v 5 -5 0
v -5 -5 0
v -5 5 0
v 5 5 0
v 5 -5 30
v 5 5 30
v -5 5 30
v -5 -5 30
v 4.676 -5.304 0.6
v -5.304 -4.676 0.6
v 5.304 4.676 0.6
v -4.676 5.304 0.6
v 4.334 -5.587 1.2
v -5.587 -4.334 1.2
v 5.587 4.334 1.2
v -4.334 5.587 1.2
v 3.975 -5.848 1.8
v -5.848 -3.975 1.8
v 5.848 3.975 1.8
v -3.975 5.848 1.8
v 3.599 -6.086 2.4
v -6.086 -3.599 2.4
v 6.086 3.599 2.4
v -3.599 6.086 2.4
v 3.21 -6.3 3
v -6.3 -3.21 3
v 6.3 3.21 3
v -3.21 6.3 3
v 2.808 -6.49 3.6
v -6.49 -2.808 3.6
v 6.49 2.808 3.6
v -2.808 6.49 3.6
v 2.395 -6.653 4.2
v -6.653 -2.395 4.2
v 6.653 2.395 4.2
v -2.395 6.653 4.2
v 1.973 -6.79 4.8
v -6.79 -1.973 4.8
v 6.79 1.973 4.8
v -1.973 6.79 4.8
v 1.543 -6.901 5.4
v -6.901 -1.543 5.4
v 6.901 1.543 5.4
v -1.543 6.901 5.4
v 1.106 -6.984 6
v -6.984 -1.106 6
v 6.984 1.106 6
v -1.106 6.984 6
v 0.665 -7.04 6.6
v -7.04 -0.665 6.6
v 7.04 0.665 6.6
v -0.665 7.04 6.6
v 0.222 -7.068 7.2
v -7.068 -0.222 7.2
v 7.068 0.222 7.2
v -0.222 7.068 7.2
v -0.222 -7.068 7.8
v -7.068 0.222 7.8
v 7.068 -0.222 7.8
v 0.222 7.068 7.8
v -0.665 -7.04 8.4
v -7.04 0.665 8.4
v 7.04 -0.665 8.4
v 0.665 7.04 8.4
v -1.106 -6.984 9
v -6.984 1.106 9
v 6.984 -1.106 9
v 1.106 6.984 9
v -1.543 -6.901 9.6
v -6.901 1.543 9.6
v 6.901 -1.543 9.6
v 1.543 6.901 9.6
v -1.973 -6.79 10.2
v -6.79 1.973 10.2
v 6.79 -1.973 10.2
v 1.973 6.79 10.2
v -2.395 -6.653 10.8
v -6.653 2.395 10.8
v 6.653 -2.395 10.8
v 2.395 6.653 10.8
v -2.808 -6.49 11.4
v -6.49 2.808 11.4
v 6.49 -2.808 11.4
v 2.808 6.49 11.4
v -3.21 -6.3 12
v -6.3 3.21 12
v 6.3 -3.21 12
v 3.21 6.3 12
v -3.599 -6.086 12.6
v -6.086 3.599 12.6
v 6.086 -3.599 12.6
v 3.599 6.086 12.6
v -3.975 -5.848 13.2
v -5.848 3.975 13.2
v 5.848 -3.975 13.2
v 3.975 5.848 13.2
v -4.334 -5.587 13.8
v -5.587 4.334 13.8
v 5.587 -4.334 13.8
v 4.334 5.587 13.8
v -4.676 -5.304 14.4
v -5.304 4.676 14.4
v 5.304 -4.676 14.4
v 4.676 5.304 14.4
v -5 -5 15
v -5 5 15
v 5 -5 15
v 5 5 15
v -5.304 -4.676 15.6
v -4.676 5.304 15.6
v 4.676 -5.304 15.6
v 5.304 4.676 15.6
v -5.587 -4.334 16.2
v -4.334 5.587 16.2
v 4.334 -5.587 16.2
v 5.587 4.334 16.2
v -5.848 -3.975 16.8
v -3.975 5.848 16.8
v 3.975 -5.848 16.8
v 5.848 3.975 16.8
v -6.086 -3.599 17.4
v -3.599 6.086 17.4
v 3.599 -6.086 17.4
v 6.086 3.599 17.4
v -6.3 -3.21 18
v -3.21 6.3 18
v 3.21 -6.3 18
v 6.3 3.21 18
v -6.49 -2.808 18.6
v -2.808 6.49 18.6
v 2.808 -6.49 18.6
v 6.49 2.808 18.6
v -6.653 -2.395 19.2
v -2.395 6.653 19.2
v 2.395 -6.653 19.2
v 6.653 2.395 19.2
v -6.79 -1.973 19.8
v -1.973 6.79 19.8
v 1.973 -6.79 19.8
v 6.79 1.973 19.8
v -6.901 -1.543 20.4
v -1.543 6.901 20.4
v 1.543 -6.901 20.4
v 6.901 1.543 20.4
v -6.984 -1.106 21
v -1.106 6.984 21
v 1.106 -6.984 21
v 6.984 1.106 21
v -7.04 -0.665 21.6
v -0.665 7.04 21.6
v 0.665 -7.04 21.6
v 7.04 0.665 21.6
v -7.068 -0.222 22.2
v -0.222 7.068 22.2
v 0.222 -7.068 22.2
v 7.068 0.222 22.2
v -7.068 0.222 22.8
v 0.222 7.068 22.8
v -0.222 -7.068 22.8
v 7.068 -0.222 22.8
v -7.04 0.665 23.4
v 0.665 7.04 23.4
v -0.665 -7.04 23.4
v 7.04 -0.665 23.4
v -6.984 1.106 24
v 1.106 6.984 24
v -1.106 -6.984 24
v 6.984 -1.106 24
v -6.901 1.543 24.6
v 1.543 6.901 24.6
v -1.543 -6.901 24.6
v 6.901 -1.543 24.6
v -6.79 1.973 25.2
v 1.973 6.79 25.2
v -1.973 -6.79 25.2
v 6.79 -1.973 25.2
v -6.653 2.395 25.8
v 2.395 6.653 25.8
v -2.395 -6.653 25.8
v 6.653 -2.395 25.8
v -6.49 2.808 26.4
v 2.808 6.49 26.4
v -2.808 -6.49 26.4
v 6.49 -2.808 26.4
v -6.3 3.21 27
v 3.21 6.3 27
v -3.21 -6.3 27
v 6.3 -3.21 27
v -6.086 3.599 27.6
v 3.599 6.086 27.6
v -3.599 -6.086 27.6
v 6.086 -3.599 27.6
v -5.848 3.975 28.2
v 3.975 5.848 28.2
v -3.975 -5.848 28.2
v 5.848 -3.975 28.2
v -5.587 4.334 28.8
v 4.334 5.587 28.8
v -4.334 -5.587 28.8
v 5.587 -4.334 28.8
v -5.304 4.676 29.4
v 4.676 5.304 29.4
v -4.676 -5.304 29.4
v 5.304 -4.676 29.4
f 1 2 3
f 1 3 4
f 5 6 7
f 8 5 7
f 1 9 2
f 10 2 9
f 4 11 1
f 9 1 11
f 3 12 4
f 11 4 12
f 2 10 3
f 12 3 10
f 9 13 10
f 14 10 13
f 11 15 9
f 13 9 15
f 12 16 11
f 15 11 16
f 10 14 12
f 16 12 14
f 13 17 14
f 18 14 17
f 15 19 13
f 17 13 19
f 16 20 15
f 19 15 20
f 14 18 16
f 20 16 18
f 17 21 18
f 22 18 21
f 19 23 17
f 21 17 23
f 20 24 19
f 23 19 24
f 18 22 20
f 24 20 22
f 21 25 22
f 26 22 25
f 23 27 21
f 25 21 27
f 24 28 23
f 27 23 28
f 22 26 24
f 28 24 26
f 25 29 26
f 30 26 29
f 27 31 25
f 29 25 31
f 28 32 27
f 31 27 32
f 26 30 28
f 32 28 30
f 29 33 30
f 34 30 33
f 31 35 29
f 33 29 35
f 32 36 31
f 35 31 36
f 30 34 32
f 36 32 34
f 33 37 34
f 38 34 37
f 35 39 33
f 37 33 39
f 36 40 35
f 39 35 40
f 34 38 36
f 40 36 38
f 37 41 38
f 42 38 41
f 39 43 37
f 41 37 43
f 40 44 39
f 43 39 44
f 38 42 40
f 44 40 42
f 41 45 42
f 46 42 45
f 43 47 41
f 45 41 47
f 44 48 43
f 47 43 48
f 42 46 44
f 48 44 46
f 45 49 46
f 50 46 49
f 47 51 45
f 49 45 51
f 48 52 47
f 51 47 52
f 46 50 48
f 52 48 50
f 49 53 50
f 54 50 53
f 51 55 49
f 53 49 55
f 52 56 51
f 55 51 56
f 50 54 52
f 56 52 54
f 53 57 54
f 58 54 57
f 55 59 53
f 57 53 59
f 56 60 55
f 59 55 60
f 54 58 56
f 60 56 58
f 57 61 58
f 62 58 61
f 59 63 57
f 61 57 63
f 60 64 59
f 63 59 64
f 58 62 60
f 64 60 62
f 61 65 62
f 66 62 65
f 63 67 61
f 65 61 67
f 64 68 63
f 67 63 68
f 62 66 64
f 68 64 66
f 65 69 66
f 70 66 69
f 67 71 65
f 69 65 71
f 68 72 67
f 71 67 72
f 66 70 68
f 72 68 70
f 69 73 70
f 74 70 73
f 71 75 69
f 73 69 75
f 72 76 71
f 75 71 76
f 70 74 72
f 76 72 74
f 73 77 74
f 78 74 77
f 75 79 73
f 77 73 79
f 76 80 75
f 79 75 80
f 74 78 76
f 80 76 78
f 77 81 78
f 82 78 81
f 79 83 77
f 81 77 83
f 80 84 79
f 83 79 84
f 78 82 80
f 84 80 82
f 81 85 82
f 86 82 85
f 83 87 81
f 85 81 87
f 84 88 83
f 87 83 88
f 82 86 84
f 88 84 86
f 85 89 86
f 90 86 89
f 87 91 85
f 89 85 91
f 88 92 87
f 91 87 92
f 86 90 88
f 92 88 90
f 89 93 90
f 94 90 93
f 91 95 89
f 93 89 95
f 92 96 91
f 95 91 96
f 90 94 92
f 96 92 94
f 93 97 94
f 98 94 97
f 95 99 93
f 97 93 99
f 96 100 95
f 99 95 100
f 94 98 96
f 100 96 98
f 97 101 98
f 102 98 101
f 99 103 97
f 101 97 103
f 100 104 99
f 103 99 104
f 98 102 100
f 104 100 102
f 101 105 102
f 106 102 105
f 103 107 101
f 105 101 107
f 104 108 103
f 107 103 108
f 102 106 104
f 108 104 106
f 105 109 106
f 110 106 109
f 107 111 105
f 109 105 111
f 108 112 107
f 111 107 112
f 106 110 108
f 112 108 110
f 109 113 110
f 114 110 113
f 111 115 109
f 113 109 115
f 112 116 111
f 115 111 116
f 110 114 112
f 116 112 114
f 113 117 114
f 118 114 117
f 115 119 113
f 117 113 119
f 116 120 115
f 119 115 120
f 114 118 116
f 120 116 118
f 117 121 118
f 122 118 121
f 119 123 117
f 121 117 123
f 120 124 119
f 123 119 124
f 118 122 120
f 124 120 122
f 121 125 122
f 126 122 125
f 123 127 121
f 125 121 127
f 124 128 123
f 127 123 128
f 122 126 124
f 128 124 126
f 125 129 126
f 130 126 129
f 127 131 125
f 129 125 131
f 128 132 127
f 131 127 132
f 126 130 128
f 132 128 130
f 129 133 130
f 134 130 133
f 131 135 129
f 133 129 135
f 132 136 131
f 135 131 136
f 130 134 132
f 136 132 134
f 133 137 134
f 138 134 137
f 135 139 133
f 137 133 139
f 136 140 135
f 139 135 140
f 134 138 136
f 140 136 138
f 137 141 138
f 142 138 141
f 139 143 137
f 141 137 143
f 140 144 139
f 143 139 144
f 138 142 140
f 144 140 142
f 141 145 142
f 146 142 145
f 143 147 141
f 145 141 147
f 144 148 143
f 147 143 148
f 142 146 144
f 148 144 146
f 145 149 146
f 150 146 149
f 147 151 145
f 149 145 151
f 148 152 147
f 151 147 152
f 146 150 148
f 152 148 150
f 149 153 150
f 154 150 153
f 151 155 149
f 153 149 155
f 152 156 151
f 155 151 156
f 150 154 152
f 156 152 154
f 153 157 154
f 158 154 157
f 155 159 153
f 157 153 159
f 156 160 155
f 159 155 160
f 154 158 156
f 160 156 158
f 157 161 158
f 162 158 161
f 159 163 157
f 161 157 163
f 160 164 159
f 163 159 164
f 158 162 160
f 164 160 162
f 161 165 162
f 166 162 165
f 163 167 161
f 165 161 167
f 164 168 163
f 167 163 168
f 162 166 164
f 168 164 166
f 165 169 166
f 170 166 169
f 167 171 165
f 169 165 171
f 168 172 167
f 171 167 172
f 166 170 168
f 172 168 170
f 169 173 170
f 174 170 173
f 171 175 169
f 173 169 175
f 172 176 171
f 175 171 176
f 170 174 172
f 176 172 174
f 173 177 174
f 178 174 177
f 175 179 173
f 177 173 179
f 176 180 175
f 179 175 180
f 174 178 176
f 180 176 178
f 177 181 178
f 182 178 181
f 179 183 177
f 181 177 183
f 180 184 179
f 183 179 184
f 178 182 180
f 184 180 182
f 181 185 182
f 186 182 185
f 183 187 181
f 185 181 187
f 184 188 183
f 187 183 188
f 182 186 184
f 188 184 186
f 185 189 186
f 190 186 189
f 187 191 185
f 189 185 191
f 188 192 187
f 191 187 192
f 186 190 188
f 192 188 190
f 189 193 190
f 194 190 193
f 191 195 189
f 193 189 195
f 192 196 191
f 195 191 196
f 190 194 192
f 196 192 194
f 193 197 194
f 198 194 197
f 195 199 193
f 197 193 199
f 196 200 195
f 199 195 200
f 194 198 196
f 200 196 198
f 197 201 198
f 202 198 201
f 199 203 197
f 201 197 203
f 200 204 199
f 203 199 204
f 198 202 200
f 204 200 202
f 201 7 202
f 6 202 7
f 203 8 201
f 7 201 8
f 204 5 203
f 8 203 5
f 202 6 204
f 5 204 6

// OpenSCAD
// Example: Twisted Square Pillar
$fn=64;
linear_extrude(height=30, twist=180, slices=50)
    square([10,10], center=true);
